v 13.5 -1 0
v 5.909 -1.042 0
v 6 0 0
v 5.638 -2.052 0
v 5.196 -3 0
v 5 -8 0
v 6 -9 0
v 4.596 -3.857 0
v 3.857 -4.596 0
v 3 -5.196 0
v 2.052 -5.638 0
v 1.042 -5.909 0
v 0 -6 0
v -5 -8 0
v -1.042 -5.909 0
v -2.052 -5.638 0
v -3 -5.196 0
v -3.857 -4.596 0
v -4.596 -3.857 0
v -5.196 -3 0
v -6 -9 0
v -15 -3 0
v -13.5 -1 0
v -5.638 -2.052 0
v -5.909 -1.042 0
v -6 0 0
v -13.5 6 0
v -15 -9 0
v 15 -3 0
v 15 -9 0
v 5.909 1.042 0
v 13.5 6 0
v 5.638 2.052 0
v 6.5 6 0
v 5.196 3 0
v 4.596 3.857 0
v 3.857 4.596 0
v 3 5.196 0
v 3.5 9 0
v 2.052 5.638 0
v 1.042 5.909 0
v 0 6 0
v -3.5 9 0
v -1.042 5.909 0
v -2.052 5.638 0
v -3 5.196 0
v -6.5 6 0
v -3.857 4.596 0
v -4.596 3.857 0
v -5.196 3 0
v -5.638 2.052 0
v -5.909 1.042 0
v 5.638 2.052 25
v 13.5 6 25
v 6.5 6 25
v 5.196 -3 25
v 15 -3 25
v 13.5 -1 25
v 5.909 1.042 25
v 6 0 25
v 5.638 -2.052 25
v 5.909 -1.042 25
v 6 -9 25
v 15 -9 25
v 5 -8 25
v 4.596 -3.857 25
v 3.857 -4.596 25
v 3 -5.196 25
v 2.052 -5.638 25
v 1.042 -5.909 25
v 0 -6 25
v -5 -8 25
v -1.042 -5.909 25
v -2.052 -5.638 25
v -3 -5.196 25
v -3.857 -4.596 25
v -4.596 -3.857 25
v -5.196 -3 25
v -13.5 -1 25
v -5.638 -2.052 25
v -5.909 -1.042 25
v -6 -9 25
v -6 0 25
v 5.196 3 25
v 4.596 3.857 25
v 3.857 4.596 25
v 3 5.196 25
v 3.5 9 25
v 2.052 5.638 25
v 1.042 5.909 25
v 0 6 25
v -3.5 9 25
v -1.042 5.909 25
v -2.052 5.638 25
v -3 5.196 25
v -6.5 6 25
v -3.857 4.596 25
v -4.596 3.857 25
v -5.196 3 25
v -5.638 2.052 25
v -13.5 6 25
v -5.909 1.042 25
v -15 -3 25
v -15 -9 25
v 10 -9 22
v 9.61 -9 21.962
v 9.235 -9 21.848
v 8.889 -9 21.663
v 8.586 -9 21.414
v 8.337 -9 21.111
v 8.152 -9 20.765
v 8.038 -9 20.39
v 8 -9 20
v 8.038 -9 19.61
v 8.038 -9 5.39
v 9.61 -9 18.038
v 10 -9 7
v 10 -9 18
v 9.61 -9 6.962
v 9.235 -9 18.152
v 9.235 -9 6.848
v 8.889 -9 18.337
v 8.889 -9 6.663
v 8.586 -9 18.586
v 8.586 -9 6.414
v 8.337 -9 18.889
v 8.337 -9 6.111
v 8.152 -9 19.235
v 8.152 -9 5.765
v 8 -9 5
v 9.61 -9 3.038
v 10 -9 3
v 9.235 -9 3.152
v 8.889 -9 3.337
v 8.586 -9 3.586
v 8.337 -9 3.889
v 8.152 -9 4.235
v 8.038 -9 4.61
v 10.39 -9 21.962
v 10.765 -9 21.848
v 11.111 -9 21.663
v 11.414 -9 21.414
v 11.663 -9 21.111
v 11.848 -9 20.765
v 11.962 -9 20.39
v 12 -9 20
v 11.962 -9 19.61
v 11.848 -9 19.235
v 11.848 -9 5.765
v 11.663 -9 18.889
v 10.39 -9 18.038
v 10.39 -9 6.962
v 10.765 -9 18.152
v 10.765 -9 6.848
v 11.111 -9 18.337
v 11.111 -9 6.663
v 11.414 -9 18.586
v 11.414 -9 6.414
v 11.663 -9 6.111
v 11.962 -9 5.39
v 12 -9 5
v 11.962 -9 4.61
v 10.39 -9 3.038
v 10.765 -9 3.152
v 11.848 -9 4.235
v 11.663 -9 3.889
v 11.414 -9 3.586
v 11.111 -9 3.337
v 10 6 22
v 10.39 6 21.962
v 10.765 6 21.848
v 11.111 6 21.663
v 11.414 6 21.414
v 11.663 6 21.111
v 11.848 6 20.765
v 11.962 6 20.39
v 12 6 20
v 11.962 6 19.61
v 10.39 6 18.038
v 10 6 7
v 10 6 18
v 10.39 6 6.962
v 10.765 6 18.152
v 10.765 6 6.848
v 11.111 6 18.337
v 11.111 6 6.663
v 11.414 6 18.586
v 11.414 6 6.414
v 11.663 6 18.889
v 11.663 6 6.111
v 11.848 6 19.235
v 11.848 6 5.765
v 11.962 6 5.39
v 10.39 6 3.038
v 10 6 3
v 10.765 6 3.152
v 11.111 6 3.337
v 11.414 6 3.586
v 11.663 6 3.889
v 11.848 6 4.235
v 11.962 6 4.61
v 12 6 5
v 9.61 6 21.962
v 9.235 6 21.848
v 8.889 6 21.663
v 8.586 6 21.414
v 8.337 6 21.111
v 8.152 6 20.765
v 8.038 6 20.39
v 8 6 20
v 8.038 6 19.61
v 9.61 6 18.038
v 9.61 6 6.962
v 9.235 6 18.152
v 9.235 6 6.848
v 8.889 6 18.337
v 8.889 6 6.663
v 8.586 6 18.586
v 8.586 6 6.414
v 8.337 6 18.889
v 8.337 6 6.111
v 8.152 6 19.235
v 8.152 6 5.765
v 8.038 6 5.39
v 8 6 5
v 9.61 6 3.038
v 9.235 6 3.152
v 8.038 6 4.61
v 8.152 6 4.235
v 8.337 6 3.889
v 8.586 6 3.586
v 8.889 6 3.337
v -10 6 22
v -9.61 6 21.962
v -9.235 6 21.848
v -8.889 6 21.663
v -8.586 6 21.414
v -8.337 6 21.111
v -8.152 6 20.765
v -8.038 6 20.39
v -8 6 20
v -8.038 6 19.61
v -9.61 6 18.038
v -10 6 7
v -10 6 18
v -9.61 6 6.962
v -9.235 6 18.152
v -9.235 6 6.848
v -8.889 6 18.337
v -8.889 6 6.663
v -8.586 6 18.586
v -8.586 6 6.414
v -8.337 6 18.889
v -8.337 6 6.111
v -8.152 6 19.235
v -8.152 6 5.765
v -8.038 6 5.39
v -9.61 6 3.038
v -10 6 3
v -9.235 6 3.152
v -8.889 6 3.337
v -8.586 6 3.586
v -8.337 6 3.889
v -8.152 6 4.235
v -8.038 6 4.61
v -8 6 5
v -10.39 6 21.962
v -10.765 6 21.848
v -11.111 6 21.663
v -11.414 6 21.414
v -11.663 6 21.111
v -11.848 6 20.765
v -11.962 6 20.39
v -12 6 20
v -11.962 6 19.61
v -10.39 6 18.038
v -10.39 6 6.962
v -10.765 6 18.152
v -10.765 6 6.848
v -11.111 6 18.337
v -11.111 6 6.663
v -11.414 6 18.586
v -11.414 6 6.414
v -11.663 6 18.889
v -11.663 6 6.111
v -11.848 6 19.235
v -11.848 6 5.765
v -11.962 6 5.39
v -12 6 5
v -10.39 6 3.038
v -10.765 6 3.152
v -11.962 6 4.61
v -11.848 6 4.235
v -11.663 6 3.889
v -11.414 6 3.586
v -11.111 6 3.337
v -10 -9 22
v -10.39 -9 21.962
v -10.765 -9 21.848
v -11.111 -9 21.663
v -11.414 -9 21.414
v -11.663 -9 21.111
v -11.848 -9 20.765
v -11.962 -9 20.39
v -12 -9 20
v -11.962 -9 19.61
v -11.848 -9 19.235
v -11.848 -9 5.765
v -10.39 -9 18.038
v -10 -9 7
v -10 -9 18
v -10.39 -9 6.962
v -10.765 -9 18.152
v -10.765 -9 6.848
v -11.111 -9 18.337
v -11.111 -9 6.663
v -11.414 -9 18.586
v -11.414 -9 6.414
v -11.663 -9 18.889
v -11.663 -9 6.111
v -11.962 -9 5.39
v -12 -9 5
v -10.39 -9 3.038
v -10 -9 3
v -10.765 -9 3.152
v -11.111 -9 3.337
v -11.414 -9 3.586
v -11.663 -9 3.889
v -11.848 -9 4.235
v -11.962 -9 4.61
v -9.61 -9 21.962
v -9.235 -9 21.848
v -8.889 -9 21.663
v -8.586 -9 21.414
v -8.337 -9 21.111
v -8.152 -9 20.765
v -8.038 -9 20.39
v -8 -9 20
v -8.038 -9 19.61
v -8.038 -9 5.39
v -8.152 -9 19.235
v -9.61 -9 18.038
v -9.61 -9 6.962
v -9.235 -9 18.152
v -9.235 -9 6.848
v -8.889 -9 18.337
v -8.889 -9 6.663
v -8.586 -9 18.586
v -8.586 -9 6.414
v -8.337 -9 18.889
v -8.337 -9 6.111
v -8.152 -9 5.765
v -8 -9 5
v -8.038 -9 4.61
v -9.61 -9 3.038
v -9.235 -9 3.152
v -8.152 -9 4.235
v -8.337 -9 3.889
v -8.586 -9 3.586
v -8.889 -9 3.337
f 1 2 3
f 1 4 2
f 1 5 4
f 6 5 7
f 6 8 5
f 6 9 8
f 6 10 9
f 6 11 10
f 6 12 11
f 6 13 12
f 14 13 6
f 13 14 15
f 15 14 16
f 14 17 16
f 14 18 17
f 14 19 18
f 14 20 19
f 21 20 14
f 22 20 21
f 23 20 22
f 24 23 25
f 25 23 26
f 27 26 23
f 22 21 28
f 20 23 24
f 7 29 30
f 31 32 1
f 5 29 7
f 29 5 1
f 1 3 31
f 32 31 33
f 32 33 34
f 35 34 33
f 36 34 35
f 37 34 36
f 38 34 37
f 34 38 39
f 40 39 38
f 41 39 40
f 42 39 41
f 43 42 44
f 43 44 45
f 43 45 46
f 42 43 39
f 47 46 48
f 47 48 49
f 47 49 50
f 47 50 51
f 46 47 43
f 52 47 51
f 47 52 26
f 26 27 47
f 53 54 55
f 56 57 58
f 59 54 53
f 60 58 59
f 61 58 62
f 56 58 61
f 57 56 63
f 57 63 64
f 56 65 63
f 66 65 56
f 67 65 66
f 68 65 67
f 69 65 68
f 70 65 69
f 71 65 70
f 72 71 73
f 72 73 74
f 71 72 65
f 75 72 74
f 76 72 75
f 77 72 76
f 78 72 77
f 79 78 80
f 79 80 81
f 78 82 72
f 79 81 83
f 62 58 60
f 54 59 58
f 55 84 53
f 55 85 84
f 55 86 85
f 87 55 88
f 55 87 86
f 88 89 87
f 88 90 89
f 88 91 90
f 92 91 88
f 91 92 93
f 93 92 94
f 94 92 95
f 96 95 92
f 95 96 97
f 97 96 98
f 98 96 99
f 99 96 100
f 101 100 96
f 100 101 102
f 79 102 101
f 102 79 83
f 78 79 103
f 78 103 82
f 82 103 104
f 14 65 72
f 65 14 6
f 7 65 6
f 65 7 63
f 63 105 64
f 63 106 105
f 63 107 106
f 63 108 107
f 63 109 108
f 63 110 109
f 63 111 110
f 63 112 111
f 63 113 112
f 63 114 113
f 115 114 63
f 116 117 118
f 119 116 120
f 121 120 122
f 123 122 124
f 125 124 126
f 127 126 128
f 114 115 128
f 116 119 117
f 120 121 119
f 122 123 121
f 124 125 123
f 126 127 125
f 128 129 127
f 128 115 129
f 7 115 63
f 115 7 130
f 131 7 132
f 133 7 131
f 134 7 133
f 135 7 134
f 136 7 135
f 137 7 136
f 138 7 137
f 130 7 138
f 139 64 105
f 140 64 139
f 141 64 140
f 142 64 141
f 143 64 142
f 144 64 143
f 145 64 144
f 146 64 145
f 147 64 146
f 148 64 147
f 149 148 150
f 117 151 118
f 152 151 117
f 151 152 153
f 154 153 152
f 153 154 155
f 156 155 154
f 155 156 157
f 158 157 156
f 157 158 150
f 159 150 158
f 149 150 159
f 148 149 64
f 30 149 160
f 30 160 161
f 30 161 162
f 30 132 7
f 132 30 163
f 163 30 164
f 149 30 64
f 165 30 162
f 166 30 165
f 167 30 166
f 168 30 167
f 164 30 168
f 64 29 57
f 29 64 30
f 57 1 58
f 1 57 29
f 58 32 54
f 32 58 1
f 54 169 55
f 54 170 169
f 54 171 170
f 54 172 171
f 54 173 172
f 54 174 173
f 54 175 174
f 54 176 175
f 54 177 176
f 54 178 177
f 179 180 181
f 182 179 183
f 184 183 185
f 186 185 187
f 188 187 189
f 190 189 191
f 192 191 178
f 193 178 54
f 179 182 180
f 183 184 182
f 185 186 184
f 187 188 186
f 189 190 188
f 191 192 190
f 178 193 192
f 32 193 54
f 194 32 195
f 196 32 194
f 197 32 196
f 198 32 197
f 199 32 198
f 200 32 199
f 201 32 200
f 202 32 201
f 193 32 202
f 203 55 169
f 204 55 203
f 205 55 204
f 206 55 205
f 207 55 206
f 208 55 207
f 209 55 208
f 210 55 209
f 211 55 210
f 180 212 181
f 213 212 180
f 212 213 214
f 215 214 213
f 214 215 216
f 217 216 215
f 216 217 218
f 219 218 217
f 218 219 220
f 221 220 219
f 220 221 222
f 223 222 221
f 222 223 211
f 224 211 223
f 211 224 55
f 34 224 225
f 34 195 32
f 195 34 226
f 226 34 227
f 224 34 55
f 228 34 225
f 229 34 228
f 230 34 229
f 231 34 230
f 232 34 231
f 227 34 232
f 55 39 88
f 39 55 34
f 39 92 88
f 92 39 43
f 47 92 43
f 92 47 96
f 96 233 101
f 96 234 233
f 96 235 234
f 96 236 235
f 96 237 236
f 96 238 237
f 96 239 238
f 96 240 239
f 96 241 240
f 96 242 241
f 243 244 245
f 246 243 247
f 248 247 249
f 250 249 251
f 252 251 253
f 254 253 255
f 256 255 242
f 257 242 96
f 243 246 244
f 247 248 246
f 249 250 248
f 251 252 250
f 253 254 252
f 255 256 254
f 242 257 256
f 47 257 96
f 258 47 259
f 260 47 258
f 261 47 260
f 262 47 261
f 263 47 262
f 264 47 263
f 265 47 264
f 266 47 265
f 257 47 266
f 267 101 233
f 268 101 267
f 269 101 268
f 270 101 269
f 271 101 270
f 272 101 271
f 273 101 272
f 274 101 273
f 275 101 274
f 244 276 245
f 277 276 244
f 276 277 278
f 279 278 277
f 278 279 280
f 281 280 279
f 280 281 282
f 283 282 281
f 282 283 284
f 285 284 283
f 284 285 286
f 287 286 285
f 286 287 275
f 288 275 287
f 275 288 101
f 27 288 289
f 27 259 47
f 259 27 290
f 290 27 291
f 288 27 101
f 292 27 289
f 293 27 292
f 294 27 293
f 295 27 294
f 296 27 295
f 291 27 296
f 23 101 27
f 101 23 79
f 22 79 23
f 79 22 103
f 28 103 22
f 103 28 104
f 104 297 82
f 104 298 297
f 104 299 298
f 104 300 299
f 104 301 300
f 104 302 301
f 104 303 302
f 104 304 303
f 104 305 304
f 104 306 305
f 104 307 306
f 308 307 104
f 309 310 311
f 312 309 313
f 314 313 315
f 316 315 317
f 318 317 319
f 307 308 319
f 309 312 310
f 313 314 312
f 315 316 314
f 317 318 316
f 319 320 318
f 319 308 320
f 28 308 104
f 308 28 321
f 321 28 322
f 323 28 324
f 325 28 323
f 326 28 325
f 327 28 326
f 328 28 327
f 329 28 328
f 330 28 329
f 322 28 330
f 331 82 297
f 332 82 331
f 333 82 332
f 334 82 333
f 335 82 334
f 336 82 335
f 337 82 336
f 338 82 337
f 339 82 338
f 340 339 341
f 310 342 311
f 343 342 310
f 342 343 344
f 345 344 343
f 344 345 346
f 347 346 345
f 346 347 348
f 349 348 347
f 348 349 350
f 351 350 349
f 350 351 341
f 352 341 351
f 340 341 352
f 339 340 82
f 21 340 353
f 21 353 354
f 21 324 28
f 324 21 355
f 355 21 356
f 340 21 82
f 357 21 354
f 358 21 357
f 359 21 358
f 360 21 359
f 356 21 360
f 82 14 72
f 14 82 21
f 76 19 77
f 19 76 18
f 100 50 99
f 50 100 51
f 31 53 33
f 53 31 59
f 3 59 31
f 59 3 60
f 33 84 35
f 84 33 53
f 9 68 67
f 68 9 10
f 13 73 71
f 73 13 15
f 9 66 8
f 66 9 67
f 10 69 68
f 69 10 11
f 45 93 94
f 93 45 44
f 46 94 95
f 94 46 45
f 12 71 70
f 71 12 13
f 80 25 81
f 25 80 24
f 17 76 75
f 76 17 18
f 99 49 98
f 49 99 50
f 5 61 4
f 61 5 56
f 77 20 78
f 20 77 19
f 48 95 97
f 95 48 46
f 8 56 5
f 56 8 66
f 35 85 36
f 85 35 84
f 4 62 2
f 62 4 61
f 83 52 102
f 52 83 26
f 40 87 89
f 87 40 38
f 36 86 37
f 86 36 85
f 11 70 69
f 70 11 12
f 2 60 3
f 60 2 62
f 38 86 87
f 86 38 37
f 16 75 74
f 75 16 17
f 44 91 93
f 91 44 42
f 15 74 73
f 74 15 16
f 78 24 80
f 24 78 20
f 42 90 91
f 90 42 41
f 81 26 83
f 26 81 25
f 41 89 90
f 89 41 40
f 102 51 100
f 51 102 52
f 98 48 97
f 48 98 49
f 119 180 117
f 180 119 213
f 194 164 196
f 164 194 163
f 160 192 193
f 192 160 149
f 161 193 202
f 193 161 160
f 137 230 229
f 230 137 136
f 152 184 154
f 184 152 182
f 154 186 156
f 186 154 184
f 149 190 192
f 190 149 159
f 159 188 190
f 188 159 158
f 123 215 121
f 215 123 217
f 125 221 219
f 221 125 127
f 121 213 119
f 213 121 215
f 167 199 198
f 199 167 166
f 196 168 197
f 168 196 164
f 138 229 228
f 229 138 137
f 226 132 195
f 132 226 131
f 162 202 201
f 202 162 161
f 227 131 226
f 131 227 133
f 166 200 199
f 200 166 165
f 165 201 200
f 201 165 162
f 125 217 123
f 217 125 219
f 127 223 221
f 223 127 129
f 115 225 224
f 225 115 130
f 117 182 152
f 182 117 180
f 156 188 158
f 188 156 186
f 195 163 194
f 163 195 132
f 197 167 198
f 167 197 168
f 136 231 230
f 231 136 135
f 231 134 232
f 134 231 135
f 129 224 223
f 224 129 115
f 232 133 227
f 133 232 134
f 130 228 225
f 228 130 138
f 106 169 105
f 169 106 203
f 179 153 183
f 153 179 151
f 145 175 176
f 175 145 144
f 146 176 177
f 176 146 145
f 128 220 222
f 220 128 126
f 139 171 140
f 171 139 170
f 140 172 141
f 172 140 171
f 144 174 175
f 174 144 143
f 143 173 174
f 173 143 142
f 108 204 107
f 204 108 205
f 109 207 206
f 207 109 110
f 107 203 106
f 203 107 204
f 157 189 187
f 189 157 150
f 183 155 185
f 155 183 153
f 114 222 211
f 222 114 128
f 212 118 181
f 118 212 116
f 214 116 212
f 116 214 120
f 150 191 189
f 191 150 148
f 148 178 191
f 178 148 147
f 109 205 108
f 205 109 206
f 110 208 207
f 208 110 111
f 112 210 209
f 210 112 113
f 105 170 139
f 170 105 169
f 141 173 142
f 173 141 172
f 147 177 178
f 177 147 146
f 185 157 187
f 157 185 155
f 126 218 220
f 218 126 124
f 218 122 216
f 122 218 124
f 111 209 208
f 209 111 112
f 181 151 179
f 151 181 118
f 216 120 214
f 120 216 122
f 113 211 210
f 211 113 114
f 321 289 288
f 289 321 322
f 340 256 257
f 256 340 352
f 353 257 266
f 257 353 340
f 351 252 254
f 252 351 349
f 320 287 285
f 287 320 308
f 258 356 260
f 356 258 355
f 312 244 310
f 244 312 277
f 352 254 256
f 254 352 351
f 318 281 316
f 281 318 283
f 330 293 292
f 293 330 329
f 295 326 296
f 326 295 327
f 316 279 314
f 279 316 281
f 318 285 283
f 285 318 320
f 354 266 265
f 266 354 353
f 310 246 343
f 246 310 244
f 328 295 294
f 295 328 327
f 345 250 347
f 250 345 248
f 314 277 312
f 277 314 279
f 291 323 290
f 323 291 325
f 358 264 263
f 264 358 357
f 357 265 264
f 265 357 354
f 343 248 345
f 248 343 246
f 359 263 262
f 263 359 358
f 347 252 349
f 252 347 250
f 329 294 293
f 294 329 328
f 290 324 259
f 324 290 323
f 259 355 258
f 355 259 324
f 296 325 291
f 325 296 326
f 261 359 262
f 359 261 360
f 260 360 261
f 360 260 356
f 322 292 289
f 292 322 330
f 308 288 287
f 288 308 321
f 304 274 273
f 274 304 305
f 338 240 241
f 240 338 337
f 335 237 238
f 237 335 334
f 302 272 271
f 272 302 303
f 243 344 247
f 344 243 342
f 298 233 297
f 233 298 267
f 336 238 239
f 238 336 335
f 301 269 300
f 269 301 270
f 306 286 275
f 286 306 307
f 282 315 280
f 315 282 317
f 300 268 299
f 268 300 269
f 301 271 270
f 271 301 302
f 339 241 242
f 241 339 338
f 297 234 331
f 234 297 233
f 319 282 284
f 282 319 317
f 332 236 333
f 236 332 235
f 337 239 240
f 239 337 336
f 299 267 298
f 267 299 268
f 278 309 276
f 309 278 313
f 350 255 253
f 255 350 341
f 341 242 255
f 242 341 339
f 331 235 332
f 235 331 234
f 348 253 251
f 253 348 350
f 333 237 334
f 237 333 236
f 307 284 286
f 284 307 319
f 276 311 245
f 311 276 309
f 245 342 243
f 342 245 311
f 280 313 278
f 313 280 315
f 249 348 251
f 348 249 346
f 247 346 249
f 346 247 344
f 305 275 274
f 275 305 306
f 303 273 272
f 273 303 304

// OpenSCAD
////////////////////////////////////////////////////////////////////////////////
// Linear Bearing
////////////////////////////////////////////////////////////////////////////////

// box
type = "SCS6UU" ; // [SCS6UU,SCS8UU,SCS10UU,SCS12UU,SCS16UU]

// stl to import
LMxUU = "" ;

/* [Hidden] */

BearingParam =
[
  //           T   h   E  [W]  L   F     G     B     C  K    S1  S2   L1    [use]   LM
  [ "SCS6UU" , 6,  9, 15, 30, 25, 18  , 15  , 20  , 15, 5   , 4, 3.4,  8, "LM6UU" , 12 ],
  [ "SCS8UU" , 6, 11, 17, 34, 30, 22  , 18  , 24  , 18, 5   , 4, 3.4,  8, "LM8UU" , 15 ],
  [ "SCS10UU", 8, 13, 20, 40, 35, 26  , 21  , 28  , 21, 6   , 5, 4.3, 12, "LM10UU", 19 ],
  [ "SCS12UU", 8, 15, 21, 42, 36, 28  , 24  , 30.5, 26, 5.75, 5, 4.3, 12, "LM12UU", 21 ],
  [ "SCS16UU", 9, 19, 25, 50, 44, 38.5, 32.5, 36  , 34, 7   , 5, 4.3, 12, "LM16UU", 28 ]
] ;



module Bearing(type)
{
  idx = search([type], BearingParam) ;
  param = (idx != [[]]) ? BearingParam[idx[0]] : BearingParam[0] ;
  
  $fa = 10   ;
  $fs =  0.4 ;

  T  = param[ 1] ;
  h  = param[ 2] ;
  E  = param[ 3] ;
  //W  = param[ 4] ;
  L  = param[ 5] ;
  F  = param[ 6] ;
  G  = param[ 7] ;
  B  = param[ 8] ;
  C  = param[ 9] ;
  K  = param[10] ;
  S1 = param[11] ;
  //S2 = param[12] ;
  L1 = param[13] ;
  // use = param[14] ;
  LM =  param[15] ;
  
  dLT = L1 - T ;
  dKS2 = (K - S1/2) / 2 ;
  dFG = F - G ;
  dLC2 = (L - C) / 2 ;
  
  module screw()
  {
    rotate([90,0,0]) cylinder(d = S1, h = L, center=true) ;    
  }
  
  difference()
  {
    linear_extrude(height = L) {
      polygon(points=[
          [E-K-S1-1, -h+1],
          [E-K-S1, -h],
          [E    , -h],
          [E    , -h+T],
          [E-dKS2, -h+T+dLT],
          [E-dKS2, -h+G],
          [E-K-S1/2-dKS2, -h+G],
          [E-K-S1/2-dKS2-dFG, -h+F],
      
          [-E+K+S1/2+dKS2+dFG, -h+F],
          [-E+K+S1/2+dKS2, -h+G],
          [-E+dKS2, -h+G],
          [-E+dKS2, -h+T+dLT],
          [-E    , -h+T],
          [-E   , -h],
          [-E+K+S1, -h],
          [-E+K+S1+1, -h+1]          
        ]) ;
    }

    cylinder(d = LM, h = 4*L, center=true) ;
    translate([ B/2, 0, dLC2]) screw() ;
    translate([ B/2, 0, L-dLC2]) screw() ;
    translate([-B/2, 0, dLC2]) screw() ;
    translate([-B/2, 0, L-dLC2]) screw() ;
  }
}

if (LMxUU != "")
{
  import(LMxUU) ;
}

Bearing(type) ;

////////////////////////////////////////////////////////////////////////////////
// EOF
////////////////////////////////////////////////////////////////////////////////
